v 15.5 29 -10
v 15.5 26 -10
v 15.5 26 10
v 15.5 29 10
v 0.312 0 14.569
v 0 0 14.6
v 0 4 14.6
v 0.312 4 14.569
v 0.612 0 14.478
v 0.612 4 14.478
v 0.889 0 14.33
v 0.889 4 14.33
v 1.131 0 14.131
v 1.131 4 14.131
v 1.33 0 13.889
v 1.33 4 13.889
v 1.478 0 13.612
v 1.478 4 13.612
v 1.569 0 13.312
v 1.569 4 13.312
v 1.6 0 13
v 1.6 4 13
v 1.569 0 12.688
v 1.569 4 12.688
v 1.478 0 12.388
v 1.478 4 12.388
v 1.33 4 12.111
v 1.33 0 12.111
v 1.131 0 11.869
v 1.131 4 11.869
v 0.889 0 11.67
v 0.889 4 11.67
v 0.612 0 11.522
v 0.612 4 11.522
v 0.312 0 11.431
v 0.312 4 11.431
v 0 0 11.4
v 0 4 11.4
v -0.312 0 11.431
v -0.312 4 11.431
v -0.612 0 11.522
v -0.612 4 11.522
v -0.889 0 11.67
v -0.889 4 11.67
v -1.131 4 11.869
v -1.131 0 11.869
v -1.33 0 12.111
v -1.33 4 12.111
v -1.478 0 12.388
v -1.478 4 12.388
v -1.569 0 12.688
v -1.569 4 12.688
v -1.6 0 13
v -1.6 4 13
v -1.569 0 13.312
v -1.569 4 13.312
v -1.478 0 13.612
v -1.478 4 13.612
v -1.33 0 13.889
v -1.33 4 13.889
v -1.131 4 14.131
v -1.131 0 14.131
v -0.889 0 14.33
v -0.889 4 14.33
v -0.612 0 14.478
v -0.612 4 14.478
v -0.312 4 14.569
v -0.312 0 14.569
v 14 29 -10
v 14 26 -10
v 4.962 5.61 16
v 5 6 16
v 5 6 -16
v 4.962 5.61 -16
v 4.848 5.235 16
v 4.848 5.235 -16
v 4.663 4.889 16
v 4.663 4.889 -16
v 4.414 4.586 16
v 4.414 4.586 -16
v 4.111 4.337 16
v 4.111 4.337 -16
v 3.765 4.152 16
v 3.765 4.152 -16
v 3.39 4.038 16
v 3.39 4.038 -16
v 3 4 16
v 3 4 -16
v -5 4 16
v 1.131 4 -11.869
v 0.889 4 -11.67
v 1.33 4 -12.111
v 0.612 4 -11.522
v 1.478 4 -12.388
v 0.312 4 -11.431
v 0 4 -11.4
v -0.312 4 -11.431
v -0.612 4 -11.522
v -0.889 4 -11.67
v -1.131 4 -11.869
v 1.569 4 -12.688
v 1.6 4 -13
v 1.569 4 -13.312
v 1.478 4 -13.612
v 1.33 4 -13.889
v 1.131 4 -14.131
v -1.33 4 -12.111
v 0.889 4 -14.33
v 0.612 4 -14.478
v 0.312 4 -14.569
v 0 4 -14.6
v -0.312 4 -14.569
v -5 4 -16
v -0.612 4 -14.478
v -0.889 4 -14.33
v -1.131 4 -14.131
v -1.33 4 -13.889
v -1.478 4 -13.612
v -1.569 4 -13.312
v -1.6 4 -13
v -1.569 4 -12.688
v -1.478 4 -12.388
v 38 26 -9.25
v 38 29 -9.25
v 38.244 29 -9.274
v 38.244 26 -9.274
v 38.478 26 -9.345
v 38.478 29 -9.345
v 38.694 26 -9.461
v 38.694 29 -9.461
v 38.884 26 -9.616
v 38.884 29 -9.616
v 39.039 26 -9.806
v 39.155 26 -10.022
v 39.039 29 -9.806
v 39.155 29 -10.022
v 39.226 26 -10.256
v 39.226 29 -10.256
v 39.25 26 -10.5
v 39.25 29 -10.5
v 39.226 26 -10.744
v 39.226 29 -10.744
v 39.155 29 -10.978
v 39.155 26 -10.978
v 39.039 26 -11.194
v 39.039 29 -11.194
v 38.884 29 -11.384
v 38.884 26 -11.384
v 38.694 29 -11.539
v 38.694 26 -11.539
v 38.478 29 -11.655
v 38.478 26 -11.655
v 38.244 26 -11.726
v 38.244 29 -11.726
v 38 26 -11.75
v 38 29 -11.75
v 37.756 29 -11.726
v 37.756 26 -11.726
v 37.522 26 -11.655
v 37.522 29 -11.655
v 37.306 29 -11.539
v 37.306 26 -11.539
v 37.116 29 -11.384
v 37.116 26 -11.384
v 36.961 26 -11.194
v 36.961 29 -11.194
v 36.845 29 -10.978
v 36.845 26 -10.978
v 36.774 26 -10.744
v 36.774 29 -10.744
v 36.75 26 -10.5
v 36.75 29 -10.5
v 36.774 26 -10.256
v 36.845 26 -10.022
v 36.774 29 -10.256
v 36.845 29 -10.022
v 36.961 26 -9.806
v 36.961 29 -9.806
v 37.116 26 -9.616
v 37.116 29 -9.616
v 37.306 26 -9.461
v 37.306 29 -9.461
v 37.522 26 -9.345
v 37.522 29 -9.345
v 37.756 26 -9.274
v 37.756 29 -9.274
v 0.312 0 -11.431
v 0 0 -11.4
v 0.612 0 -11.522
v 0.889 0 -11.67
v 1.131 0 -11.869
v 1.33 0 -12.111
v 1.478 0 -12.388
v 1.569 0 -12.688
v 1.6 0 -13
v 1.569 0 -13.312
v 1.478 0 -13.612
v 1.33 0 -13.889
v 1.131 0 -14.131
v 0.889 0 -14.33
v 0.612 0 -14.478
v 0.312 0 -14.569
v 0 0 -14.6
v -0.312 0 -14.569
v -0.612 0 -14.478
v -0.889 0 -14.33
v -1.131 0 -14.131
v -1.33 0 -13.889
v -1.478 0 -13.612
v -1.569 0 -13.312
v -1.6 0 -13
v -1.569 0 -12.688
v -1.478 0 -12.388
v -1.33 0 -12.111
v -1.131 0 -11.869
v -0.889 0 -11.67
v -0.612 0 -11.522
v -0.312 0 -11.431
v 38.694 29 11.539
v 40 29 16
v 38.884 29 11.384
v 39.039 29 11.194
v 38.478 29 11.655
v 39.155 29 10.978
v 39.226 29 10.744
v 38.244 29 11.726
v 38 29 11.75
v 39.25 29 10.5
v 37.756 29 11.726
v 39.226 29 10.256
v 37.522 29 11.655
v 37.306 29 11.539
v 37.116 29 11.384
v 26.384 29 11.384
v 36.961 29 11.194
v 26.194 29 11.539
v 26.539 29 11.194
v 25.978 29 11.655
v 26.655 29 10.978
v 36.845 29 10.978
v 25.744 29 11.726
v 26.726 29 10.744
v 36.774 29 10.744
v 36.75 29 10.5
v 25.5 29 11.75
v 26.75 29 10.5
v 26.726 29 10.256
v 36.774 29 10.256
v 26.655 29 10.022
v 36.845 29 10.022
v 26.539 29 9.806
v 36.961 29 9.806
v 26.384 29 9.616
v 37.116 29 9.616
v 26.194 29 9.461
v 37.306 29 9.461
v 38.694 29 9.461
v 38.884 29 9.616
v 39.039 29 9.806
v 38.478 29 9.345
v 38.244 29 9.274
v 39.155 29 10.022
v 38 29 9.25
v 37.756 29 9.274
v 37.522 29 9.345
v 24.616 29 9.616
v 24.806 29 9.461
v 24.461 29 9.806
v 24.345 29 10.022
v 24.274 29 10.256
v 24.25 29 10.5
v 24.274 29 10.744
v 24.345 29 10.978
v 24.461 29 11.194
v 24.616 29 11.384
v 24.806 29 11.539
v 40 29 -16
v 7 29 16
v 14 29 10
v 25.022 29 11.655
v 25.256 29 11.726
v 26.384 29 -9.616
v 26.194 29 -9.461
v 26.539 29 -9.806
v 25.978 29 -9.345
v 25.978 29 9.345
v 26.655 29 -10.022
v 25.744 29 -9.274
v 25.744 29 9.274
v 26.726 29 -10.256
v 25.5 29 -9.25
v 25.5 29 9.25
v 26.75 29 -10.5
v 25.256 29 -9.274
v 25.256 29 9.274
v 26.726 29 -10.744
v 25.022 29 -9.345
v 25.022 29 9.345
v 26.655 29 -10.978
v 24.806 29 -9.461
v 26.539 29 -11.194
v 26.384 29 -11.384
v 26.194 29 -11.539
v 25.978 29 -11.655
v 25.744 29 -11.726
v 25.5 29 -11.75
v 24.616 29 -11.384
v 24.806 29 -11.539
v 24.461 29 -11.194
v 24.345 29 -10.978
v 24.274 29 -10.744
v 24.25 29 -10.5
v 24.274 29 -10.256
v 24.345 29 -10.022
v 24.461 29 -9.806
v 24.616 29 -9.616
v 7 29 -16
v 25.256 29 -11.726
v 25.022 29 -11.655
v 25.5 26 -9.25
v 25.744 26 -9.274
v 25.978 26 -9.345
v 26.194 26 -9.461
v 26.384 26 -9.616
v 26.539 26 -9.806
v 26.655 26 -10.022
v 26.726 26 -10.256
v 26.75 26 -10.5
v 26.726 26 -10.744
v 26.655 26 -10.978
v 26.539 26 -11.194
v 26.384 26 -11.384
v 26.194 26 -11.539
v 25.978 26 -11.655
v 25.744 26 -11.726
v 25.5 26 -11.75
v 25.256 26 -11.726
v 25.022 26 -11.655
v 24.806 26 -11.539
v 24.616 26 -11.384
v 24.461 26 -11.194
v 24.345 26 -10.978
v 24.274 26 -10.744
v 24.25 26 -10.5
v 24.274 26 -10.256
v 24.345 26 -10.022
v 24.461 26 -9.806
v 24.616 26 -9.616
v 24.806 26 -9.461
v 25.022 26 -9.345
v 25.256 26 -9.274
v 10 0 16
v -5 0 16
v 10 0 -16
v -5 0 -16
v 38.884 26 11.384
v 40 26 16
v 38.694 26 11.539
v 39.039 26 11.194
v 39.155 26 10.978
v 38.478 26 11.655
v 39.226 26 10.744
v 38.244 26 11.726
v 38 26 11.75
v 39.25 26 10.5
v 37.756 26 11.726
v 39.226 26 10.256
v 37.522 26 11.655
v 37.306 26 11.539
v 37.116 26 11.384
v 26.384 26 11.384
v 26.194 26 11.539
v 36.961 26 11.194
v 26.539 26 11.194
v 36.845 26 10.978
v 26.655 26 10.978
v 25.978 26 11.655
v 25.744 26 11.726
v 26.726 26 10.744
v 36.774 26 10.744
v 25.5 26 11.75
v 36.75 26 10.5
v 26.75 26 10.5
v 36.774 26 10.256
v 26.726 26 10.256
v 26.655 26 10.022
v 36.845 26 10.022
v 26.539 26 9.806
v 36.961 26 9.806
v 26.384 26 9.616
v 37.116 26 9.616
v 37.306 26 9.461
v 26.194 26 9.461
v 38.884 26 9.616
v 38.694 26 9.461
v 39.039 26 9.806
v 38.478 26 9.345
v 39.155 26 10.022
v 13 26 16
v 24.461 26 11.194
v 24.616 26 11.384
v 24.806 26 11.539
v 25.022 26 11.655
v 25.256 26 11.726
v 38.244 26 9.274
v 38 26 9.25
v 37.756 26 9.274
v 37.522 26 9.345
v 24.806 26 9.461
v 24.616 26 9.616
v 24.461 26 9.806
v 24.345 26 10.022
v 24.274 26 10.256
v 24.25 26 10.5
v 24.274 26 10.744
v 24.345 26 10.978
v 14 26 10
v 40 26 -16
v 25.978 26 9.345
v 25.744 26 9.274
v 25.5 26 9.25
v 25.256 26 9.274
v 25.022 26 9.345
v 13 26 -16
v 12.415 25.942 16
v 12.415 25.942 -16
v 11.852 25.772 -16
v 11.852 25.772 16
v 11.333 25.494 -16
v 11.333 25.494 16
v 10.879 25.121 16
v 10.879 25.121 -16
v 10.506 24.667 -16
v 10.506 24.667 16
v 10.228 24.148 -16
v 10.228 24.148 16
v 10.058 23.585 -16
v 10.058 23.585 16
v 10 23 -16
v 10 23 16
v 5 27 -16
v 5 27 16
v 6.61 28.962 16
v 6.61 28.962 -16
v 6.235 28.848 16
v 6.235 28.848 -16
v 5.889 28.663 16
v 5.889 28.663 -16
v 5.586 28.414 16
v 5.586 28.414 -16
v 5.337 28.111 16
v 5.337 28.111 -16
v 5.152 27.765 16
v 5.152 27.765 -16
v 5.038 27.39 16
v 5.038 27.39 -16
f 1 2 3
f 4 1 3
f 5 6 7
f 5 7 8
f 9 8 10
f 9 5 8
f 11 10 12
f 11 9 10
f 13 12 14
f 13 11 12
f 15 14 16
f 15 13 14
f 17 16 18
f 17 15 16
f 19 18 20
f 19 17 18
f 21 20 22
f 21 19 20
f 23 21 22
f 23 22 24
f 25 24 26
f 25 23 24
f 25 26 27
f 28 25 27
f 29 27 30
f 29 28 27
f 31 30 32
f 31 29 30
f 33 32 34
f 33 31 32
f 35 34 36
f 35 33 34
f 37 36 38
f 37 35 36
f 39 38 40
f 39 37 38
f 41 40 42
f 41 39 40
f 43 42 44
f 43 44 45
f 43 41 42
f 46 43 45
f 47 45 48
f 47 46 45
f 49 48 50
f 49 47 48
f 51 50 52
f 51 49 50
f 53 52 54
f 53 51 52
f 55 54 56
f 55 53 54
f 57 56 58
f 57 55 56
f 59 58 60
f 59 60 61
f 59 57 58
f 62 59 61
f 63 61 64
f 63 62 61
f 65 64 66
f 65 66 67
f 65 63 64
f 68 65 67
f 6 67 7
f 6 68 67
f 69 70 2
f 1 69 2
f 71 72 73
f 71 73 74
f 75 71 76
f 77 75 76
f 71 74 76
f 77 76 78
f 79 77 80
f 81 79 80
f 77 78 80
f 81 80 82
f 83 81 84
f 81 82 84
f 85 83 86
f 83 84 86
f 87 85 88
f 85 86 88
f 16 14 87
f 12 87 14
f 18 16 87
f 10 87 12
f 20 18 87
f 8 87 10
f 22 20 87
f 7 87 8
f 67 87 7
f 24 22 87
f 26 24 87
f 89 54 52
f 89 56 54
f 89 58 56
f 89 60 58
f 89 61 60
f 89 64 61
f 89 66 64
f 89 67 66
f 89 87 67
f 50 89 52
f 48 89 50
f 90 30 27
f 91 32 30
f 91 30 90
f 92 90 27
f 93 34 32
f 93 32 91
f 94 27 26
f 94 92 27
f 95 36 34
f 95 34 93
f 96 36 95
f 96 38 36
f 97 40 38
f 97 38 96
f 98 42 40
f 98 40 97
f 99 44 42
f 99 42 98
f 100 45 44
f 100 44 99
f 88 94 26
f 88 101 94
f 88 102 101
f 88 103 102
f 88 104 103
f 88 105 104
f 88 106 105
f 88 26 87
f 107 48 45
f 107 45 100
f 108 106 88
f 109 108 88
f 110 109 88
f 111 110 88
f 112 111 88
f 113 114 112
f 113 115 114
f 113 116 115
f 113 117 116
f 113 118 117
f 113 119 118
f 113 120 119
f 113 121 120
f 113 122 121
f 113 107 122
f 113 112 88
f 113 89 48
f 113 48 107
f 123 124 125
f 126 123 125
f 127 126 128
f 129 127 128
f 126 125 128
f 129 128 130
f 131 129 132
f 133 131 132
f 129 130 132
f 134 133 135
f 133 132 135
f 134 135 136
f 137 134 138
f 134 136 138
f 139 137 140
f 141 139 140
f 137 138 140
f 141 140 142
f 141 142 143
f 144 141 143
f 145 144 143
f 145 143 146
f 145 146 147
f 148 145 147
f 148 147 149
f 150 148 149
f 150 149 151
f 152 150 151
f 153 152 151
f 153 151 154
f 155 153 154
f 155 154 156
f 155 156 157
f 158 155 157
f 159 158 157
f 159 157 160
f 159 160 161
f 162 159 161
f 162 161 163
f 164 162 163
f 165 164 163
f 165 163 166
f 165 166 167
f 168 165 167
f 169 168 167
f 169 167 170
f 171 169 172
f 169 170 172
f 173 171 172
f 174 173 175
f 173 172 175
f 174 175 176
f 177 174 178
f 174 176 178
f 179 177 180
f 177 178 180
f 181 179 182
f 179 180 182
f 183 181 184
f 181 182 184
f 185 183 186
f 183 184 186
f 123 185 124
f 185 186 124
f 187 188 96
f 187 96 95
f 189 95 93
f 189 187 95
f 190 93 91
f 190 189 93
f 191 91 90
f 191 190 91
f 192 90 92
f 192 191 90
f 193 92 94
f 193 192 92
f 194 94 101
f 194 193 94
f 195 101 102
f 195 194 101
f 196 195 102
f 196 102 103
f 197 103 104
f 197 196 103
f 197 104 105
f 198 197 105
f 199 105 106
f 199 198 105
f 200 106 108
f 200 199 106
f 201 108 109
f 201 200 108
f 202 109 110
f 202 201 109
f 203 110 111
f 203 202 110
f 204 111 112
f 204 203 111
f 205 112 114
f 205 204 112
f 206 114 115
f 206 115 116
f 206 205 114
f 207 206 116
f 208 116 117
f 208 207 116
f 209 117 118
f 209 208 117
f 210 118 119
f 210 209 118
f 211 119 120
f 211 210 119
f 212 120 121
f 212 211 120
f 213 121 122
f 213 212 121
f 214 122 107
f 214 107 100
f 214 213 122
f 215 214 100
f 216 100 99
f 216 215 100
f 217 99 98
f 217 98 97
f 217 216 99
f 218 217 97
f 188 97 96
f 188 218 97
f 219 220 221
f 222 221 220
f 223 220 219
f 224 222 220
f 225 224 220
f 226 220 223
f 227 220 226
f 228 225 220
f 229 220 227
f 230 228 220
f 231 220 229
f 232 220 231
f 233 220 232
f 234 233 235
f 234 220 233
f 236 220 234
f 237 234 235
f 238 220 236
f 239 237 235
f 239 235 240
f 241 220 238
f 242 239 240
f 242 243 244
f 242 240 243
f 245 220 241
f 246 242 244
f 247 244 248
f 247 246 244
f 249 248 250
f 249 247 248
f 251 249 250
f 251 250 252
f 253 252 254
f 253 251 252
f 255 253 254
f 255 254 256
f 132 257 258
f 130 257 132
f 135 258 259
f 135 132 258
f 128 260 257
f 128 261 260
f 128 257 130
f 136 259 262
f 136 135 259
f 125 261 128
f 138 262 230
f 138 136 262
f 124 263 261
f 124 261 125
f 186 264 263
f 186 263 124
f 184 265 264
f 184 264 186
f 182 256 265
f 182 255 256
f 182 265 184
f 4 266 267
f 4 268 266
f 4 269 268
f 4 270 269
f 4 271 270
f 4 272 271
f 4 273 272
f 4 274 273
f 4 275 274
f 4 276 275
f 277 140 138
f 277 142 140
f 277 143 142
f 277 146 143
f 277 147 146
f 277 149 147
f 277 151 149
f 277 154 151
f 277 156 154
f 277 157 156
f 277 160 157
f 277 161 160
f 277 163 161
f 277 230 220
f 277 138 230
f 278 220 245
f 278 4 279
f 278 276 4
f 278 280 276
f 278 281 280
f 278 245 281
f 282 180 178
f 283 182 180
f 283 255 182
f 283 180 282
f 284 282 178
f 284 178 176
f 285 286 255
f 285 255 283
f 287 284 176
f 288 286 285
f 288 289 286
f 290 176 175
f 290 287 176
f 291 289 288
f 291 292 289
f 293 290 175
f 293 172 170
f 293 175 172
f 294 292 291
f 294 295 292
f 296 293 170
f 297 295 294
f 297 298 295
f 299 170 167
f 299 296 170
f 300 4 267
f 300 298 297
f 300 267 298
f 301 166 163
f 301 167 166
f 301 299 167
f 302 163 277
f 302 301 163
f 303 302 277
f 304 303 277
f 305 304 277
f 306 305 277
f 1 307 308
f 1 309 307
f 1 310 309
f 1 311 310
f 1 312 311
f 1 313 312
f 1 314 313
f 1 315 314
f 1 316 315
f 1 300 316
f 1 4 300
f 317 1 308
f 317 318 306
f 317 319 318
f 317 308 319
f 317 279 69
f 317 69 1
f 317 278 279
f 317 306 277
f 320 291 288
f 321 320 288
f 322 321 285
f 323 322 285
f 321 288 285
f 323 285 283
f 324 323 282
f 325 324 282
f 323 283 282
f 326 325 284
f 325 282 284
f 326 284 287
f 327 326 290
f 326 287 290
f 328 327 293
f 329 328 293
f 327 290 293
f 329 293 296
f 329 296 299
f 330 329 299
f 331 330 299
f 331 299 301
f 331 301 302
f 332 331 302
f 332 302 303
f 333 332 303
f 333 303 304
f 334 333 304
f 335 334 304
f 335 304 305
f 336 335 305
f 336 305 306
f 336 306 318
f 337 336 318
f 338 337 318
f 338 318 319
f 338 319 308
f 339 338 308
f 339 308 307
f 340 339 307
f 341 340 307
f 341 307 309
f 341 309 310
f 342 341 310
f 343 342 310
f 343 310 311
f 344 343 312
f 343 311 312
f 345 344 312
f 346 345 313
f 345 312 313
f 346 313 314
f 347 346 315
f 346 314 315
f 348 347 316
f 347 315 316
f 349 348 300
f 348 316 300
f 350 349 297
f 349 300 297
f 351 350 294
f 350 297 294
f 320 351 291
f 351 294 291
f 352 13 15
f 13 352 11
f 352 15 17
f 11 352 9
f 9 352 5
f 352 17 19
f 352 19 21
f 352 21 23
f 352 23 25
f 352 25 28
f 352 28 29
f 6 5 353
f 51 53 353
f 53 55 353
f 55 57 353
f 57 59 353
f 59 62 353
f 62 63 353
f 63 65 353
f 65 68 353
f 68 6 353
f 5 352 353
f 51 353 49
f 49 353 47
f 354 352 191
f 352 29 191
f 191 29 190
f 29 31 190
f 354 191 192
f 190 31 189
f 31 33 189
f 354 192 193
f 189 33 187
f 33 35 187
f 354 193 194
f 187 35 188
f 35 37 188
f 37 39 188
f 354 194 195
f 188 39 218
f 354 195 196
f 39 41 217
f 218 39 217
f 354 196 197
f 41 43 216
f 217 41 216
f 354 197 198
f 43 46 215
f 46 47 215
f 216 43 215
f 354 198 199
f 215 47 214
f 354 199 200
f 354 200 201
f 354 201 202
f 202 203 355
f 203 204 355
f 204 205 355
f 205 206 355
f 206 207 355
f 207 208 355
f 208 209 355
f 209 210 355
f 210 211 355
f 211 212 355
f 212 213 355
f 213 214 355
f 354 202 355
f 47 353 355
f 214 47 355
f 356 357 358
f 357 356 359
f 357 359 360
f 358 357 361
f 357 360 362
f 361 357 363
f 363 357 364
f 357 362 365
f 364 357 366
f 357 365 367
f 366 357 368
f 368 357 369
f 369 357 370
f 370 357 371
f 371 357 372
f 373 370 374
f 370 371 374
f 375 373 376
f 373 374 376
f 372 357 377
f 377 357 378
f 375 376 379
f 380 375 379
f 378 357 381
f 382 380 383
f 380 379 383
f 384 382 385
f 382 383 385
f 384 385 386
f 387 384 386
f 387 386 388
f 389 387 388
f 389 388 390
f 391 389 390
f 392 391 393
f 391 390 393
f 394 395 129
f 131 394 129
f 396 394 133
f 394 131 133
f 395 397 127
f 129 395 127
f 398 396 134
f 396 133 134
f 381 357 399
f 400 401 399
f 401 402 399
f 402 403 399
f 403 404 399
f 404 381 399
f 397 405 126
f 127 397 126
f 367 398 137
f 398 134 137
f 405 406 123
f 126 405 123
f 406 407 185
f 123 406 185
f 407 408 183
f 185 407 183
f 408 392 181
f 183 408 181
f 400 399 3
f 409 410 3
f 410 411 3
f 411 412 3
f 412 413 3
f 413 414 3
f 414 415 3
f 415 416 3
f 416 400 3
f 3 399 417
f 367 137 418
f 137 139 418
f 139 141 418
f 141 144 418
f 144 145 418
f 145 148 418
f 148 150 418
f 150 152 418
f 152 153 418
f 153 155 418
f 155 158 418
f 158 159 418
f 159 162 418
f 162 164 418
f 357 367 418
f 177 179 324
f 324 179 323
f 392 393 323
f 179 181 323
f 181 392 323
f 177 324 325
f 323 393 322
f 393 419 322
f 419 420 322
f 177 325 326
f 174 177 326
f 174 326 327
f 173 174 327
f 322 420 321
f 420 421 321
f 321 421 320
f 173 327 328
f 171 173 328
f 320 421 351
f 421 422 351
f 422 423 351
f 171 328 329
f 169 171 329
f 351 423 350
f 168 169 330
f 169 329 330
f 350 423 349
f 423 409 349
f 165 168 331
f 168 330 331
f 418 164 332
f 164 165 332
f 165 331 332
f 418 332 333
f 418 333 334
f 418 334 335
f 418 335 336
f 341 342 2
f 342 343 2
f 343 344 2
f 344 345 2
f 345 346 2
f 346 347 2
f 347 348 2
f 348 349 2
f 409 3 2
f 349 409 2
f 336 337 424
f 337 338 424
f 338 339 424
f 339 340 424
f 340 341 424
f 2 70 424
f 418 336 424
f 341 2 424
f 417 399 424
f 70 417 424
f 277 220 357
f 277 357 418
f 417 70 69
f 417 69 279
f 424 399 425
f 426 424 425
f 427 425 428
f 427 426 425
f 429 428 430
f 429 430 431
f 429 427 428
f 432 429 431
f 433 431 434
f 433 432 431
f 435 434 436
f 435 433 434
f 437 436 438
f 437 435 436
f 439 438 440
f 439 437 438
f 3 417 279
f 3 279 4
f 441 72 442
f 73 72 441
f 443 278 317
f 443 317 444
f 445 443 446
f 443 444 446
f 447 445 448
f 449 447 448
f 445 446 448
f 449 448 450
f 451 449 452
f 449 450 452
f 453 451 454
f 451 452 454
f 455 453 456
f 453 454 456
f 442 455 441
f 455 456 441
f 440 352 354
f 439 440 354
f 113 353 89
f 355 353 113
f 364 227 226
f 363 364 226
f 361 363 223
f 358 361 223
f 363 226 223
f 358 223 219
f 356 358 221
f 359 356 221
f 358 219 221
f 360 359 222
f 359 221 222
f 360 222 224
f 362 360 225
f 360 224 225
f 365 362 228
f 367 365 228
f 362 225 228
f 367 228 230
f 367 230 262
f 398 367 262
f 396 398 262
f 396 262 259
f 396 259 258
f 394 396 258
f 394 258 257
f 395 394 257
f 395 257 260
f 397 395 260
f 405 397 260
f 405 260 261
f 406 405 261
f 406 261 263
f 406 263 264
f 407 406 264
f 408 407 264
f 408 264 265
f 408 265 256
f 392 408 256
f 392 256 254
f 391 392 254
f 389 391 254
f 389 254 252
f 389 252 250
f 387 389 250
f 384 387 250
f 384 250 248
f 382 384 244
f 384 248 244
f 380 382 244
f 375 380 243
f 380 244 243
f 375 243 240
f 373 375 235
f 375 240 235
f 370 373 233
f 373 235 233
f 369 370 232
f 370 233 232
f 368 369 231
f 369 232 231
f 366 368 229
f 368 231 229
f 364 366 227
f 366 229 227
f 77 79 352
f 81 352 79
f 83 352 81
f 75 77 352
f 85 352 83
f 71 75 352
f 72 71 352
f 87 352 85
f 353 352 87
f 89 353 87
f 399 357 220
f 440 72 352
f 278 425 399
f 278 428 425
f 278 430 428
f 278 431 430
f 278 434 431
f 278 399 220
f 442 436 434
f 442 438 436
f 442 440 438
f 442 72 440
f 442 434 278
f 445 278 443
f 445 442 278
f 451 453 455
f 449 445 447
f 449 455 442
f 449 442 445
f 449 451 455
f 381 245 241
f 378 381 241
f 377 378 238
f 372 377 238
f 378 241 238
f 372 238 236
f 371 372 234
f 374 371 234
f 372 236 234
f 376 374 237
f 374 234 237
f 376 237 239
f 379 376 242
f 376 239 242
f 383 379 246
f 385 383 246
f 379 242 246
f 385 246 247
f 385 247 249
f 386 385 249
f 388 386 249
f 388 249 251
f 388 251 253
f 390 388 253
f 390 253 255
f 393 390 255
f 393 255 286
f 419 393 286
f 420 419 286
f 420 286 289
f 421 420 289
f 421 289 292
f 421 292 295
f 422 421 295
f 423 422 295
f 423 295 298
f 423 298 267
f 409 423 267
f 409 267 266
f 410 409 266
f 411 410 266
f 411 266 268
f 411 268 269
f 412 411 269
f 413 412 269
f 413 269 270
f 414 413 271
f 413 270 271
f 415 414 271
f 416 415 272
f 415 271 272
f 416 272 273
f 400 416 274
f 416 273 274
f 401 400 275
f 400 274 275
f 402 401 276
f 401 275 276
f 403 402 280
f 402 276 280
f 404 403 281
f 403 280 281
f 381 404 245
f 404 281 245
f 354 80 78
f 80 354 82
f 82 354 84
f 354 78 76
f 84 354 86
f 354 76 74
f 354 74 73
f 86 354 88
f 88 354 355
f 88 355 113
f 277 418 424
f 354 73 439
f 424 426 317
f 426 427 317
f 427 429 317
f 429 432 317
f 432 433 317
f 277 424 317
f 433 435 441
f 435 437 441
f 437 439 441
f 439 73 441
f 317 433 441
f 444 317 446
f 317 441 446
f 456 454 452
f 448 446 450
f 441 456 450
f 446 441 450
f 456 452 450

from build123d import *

# Parameters (mm, degrees)
SKETCH1_W           = 10
SKETCH1_H           = 32
SKETCH1_R           = 1.6
BOSS_EXTRUDE1_DEPTH = 4
SKETCH2_W           = 32
SKETCH2_H           = 4
BOSS_EXTRUDE2_DEPTH = 5
SKETCH3_W           = 5
SKETCH3_H           = 32
BOSS_EXTRUDE3_DEPTH = 25
FILLET1_R           = 2
SKETCH4_W           = 32
SKETCH4_H           = 3
BOSS_EXTRUDE4_DEPTH = 30
SKETCH5_R           = 1.25
CUT_EXTRUDE1_DEPTH  = 25
FILLET2_R           = 2
FILLET3_R           = 3
SKETCH7_W           = 1.5
SKETCH7_H           = 20
CUT_EXTRUDE2_DEPTH  = 10


with BuildPart() as part:
    # Sketch1 → Boss-Extrude1 (new body)
    with BuildSketch(Plane(origin=(0, 0, 0), x_dir=(1, 0, 0), z_dir=(0, 1, 0))):
        Rectangle(SKETCH1_W, SKETCH1_H)
        with Locations(Location((0, -13, 0), (0, 0, 270))):
            Circle(SKETCH1_R, mode=Mode.SUBTRACT)
        with Locations(Location((0, 13, 0), (0, 0, 270))):
            Circle(SKETCH1_R, mode=Mode.SUBTRACT)
    extrude(amount=BOSS_EXTRUDE1_DEPTH)

    # Sketch2 → Boss-Extrude2 (add)
    with BuildSketch(Plane(origin=(5, 0, 0), x_dir=(0, 0, -1), z_dir=(1, 0, 0))):
        with Locations((0, 2)):
            Rectangle(SKETCH2_W, SKETCH2_H)
    extrude(amount=BOSS_EXTRUDE2_DEPTH)

    # Sketch3 → Boss-Extrude3 (add)
    with BuildSketch(Plane(origin=(0, 4, 0), x_dir=(1, 0, 0), z_dir=(0, 1, 0))):
        with Locations((7.5, 0)):
            Rectangle(SKETCH3_W, SKETCH3_H)
    extrude(amount=BOSS_EXTRUDE3_DEPTH)

    # Fillet1
    fillet1_edges = [part.edges().sort_by_distance(p)[0] for p in [
        (5, 4, 0),
    ]]
    fillet(fillet1_edges, radius=FILLET1_R)

    # Sketch4 → Boss-Extrude4 (add)
    with BuildSketch(Plane(origin=(10, 0, 0), x_dir=(0, 0, -1), z_dir=(1, 0, 0))):
        with Locations((0, 27.5)):
            Rectangle(SKETCH4_W, SKETCH4_H)
    extrude(amount=BOSS_EXTRUDE4_DEPTH)

    # Sketch5 → Cut-Extrude1 (cut)
    with BuildSketch(Plane(origin=(0, 29, 0), x_dir=(1, 0, 0), z_dir=(0, 1, 0))):
        with Locations(Location((38, -10.5, 0), (0, 0, 270))):
            Circle(SKETCH5_R)
        with Locations(Location((38, 10.5, 0), (0, 0, 270))):
            Circle(SKETCH5_R)
        with Locations(Location((25.5, 10.5, 0), (0, 0, 270))):
            Circle(SKETCH5_R)
        with Locations(Location((25.5, -10.5, 0), (0, 0, 270))):
            Circle(SKETCH5_R)
    extrude(amount=-CUT_EXTRUDE1_DEPTH, mode=Mode.SUBTRACT)

    # Fillet2
    fillet2_edges = [part.edges().sort_by_distance(p)[0] for p in [
        (5, 29, 0),
    ]]
    fillet(fillet2_edges, radius=FILLET2_R)

    # Fillet3
    fillet3_edges = [part.edges().sort_by_distance(p)[0] for p in [
        (10, 26, 0),
    ]]
    fillet(fillet3_edges, radius=FILLET3_R)

    # Sketch7 → Cut-Extrude2 (cut)
    with BuildSketch(Plane.XZ.offset(-26)):
        with Locations((14.75, 0)):
            Rectangle(SKETCH7_W, SKETCH7_H)
    extrude(amount=-CUT_EXTRUDE2_DEPTH, mode=Mode.SUBTRACT)


solid = part.part
